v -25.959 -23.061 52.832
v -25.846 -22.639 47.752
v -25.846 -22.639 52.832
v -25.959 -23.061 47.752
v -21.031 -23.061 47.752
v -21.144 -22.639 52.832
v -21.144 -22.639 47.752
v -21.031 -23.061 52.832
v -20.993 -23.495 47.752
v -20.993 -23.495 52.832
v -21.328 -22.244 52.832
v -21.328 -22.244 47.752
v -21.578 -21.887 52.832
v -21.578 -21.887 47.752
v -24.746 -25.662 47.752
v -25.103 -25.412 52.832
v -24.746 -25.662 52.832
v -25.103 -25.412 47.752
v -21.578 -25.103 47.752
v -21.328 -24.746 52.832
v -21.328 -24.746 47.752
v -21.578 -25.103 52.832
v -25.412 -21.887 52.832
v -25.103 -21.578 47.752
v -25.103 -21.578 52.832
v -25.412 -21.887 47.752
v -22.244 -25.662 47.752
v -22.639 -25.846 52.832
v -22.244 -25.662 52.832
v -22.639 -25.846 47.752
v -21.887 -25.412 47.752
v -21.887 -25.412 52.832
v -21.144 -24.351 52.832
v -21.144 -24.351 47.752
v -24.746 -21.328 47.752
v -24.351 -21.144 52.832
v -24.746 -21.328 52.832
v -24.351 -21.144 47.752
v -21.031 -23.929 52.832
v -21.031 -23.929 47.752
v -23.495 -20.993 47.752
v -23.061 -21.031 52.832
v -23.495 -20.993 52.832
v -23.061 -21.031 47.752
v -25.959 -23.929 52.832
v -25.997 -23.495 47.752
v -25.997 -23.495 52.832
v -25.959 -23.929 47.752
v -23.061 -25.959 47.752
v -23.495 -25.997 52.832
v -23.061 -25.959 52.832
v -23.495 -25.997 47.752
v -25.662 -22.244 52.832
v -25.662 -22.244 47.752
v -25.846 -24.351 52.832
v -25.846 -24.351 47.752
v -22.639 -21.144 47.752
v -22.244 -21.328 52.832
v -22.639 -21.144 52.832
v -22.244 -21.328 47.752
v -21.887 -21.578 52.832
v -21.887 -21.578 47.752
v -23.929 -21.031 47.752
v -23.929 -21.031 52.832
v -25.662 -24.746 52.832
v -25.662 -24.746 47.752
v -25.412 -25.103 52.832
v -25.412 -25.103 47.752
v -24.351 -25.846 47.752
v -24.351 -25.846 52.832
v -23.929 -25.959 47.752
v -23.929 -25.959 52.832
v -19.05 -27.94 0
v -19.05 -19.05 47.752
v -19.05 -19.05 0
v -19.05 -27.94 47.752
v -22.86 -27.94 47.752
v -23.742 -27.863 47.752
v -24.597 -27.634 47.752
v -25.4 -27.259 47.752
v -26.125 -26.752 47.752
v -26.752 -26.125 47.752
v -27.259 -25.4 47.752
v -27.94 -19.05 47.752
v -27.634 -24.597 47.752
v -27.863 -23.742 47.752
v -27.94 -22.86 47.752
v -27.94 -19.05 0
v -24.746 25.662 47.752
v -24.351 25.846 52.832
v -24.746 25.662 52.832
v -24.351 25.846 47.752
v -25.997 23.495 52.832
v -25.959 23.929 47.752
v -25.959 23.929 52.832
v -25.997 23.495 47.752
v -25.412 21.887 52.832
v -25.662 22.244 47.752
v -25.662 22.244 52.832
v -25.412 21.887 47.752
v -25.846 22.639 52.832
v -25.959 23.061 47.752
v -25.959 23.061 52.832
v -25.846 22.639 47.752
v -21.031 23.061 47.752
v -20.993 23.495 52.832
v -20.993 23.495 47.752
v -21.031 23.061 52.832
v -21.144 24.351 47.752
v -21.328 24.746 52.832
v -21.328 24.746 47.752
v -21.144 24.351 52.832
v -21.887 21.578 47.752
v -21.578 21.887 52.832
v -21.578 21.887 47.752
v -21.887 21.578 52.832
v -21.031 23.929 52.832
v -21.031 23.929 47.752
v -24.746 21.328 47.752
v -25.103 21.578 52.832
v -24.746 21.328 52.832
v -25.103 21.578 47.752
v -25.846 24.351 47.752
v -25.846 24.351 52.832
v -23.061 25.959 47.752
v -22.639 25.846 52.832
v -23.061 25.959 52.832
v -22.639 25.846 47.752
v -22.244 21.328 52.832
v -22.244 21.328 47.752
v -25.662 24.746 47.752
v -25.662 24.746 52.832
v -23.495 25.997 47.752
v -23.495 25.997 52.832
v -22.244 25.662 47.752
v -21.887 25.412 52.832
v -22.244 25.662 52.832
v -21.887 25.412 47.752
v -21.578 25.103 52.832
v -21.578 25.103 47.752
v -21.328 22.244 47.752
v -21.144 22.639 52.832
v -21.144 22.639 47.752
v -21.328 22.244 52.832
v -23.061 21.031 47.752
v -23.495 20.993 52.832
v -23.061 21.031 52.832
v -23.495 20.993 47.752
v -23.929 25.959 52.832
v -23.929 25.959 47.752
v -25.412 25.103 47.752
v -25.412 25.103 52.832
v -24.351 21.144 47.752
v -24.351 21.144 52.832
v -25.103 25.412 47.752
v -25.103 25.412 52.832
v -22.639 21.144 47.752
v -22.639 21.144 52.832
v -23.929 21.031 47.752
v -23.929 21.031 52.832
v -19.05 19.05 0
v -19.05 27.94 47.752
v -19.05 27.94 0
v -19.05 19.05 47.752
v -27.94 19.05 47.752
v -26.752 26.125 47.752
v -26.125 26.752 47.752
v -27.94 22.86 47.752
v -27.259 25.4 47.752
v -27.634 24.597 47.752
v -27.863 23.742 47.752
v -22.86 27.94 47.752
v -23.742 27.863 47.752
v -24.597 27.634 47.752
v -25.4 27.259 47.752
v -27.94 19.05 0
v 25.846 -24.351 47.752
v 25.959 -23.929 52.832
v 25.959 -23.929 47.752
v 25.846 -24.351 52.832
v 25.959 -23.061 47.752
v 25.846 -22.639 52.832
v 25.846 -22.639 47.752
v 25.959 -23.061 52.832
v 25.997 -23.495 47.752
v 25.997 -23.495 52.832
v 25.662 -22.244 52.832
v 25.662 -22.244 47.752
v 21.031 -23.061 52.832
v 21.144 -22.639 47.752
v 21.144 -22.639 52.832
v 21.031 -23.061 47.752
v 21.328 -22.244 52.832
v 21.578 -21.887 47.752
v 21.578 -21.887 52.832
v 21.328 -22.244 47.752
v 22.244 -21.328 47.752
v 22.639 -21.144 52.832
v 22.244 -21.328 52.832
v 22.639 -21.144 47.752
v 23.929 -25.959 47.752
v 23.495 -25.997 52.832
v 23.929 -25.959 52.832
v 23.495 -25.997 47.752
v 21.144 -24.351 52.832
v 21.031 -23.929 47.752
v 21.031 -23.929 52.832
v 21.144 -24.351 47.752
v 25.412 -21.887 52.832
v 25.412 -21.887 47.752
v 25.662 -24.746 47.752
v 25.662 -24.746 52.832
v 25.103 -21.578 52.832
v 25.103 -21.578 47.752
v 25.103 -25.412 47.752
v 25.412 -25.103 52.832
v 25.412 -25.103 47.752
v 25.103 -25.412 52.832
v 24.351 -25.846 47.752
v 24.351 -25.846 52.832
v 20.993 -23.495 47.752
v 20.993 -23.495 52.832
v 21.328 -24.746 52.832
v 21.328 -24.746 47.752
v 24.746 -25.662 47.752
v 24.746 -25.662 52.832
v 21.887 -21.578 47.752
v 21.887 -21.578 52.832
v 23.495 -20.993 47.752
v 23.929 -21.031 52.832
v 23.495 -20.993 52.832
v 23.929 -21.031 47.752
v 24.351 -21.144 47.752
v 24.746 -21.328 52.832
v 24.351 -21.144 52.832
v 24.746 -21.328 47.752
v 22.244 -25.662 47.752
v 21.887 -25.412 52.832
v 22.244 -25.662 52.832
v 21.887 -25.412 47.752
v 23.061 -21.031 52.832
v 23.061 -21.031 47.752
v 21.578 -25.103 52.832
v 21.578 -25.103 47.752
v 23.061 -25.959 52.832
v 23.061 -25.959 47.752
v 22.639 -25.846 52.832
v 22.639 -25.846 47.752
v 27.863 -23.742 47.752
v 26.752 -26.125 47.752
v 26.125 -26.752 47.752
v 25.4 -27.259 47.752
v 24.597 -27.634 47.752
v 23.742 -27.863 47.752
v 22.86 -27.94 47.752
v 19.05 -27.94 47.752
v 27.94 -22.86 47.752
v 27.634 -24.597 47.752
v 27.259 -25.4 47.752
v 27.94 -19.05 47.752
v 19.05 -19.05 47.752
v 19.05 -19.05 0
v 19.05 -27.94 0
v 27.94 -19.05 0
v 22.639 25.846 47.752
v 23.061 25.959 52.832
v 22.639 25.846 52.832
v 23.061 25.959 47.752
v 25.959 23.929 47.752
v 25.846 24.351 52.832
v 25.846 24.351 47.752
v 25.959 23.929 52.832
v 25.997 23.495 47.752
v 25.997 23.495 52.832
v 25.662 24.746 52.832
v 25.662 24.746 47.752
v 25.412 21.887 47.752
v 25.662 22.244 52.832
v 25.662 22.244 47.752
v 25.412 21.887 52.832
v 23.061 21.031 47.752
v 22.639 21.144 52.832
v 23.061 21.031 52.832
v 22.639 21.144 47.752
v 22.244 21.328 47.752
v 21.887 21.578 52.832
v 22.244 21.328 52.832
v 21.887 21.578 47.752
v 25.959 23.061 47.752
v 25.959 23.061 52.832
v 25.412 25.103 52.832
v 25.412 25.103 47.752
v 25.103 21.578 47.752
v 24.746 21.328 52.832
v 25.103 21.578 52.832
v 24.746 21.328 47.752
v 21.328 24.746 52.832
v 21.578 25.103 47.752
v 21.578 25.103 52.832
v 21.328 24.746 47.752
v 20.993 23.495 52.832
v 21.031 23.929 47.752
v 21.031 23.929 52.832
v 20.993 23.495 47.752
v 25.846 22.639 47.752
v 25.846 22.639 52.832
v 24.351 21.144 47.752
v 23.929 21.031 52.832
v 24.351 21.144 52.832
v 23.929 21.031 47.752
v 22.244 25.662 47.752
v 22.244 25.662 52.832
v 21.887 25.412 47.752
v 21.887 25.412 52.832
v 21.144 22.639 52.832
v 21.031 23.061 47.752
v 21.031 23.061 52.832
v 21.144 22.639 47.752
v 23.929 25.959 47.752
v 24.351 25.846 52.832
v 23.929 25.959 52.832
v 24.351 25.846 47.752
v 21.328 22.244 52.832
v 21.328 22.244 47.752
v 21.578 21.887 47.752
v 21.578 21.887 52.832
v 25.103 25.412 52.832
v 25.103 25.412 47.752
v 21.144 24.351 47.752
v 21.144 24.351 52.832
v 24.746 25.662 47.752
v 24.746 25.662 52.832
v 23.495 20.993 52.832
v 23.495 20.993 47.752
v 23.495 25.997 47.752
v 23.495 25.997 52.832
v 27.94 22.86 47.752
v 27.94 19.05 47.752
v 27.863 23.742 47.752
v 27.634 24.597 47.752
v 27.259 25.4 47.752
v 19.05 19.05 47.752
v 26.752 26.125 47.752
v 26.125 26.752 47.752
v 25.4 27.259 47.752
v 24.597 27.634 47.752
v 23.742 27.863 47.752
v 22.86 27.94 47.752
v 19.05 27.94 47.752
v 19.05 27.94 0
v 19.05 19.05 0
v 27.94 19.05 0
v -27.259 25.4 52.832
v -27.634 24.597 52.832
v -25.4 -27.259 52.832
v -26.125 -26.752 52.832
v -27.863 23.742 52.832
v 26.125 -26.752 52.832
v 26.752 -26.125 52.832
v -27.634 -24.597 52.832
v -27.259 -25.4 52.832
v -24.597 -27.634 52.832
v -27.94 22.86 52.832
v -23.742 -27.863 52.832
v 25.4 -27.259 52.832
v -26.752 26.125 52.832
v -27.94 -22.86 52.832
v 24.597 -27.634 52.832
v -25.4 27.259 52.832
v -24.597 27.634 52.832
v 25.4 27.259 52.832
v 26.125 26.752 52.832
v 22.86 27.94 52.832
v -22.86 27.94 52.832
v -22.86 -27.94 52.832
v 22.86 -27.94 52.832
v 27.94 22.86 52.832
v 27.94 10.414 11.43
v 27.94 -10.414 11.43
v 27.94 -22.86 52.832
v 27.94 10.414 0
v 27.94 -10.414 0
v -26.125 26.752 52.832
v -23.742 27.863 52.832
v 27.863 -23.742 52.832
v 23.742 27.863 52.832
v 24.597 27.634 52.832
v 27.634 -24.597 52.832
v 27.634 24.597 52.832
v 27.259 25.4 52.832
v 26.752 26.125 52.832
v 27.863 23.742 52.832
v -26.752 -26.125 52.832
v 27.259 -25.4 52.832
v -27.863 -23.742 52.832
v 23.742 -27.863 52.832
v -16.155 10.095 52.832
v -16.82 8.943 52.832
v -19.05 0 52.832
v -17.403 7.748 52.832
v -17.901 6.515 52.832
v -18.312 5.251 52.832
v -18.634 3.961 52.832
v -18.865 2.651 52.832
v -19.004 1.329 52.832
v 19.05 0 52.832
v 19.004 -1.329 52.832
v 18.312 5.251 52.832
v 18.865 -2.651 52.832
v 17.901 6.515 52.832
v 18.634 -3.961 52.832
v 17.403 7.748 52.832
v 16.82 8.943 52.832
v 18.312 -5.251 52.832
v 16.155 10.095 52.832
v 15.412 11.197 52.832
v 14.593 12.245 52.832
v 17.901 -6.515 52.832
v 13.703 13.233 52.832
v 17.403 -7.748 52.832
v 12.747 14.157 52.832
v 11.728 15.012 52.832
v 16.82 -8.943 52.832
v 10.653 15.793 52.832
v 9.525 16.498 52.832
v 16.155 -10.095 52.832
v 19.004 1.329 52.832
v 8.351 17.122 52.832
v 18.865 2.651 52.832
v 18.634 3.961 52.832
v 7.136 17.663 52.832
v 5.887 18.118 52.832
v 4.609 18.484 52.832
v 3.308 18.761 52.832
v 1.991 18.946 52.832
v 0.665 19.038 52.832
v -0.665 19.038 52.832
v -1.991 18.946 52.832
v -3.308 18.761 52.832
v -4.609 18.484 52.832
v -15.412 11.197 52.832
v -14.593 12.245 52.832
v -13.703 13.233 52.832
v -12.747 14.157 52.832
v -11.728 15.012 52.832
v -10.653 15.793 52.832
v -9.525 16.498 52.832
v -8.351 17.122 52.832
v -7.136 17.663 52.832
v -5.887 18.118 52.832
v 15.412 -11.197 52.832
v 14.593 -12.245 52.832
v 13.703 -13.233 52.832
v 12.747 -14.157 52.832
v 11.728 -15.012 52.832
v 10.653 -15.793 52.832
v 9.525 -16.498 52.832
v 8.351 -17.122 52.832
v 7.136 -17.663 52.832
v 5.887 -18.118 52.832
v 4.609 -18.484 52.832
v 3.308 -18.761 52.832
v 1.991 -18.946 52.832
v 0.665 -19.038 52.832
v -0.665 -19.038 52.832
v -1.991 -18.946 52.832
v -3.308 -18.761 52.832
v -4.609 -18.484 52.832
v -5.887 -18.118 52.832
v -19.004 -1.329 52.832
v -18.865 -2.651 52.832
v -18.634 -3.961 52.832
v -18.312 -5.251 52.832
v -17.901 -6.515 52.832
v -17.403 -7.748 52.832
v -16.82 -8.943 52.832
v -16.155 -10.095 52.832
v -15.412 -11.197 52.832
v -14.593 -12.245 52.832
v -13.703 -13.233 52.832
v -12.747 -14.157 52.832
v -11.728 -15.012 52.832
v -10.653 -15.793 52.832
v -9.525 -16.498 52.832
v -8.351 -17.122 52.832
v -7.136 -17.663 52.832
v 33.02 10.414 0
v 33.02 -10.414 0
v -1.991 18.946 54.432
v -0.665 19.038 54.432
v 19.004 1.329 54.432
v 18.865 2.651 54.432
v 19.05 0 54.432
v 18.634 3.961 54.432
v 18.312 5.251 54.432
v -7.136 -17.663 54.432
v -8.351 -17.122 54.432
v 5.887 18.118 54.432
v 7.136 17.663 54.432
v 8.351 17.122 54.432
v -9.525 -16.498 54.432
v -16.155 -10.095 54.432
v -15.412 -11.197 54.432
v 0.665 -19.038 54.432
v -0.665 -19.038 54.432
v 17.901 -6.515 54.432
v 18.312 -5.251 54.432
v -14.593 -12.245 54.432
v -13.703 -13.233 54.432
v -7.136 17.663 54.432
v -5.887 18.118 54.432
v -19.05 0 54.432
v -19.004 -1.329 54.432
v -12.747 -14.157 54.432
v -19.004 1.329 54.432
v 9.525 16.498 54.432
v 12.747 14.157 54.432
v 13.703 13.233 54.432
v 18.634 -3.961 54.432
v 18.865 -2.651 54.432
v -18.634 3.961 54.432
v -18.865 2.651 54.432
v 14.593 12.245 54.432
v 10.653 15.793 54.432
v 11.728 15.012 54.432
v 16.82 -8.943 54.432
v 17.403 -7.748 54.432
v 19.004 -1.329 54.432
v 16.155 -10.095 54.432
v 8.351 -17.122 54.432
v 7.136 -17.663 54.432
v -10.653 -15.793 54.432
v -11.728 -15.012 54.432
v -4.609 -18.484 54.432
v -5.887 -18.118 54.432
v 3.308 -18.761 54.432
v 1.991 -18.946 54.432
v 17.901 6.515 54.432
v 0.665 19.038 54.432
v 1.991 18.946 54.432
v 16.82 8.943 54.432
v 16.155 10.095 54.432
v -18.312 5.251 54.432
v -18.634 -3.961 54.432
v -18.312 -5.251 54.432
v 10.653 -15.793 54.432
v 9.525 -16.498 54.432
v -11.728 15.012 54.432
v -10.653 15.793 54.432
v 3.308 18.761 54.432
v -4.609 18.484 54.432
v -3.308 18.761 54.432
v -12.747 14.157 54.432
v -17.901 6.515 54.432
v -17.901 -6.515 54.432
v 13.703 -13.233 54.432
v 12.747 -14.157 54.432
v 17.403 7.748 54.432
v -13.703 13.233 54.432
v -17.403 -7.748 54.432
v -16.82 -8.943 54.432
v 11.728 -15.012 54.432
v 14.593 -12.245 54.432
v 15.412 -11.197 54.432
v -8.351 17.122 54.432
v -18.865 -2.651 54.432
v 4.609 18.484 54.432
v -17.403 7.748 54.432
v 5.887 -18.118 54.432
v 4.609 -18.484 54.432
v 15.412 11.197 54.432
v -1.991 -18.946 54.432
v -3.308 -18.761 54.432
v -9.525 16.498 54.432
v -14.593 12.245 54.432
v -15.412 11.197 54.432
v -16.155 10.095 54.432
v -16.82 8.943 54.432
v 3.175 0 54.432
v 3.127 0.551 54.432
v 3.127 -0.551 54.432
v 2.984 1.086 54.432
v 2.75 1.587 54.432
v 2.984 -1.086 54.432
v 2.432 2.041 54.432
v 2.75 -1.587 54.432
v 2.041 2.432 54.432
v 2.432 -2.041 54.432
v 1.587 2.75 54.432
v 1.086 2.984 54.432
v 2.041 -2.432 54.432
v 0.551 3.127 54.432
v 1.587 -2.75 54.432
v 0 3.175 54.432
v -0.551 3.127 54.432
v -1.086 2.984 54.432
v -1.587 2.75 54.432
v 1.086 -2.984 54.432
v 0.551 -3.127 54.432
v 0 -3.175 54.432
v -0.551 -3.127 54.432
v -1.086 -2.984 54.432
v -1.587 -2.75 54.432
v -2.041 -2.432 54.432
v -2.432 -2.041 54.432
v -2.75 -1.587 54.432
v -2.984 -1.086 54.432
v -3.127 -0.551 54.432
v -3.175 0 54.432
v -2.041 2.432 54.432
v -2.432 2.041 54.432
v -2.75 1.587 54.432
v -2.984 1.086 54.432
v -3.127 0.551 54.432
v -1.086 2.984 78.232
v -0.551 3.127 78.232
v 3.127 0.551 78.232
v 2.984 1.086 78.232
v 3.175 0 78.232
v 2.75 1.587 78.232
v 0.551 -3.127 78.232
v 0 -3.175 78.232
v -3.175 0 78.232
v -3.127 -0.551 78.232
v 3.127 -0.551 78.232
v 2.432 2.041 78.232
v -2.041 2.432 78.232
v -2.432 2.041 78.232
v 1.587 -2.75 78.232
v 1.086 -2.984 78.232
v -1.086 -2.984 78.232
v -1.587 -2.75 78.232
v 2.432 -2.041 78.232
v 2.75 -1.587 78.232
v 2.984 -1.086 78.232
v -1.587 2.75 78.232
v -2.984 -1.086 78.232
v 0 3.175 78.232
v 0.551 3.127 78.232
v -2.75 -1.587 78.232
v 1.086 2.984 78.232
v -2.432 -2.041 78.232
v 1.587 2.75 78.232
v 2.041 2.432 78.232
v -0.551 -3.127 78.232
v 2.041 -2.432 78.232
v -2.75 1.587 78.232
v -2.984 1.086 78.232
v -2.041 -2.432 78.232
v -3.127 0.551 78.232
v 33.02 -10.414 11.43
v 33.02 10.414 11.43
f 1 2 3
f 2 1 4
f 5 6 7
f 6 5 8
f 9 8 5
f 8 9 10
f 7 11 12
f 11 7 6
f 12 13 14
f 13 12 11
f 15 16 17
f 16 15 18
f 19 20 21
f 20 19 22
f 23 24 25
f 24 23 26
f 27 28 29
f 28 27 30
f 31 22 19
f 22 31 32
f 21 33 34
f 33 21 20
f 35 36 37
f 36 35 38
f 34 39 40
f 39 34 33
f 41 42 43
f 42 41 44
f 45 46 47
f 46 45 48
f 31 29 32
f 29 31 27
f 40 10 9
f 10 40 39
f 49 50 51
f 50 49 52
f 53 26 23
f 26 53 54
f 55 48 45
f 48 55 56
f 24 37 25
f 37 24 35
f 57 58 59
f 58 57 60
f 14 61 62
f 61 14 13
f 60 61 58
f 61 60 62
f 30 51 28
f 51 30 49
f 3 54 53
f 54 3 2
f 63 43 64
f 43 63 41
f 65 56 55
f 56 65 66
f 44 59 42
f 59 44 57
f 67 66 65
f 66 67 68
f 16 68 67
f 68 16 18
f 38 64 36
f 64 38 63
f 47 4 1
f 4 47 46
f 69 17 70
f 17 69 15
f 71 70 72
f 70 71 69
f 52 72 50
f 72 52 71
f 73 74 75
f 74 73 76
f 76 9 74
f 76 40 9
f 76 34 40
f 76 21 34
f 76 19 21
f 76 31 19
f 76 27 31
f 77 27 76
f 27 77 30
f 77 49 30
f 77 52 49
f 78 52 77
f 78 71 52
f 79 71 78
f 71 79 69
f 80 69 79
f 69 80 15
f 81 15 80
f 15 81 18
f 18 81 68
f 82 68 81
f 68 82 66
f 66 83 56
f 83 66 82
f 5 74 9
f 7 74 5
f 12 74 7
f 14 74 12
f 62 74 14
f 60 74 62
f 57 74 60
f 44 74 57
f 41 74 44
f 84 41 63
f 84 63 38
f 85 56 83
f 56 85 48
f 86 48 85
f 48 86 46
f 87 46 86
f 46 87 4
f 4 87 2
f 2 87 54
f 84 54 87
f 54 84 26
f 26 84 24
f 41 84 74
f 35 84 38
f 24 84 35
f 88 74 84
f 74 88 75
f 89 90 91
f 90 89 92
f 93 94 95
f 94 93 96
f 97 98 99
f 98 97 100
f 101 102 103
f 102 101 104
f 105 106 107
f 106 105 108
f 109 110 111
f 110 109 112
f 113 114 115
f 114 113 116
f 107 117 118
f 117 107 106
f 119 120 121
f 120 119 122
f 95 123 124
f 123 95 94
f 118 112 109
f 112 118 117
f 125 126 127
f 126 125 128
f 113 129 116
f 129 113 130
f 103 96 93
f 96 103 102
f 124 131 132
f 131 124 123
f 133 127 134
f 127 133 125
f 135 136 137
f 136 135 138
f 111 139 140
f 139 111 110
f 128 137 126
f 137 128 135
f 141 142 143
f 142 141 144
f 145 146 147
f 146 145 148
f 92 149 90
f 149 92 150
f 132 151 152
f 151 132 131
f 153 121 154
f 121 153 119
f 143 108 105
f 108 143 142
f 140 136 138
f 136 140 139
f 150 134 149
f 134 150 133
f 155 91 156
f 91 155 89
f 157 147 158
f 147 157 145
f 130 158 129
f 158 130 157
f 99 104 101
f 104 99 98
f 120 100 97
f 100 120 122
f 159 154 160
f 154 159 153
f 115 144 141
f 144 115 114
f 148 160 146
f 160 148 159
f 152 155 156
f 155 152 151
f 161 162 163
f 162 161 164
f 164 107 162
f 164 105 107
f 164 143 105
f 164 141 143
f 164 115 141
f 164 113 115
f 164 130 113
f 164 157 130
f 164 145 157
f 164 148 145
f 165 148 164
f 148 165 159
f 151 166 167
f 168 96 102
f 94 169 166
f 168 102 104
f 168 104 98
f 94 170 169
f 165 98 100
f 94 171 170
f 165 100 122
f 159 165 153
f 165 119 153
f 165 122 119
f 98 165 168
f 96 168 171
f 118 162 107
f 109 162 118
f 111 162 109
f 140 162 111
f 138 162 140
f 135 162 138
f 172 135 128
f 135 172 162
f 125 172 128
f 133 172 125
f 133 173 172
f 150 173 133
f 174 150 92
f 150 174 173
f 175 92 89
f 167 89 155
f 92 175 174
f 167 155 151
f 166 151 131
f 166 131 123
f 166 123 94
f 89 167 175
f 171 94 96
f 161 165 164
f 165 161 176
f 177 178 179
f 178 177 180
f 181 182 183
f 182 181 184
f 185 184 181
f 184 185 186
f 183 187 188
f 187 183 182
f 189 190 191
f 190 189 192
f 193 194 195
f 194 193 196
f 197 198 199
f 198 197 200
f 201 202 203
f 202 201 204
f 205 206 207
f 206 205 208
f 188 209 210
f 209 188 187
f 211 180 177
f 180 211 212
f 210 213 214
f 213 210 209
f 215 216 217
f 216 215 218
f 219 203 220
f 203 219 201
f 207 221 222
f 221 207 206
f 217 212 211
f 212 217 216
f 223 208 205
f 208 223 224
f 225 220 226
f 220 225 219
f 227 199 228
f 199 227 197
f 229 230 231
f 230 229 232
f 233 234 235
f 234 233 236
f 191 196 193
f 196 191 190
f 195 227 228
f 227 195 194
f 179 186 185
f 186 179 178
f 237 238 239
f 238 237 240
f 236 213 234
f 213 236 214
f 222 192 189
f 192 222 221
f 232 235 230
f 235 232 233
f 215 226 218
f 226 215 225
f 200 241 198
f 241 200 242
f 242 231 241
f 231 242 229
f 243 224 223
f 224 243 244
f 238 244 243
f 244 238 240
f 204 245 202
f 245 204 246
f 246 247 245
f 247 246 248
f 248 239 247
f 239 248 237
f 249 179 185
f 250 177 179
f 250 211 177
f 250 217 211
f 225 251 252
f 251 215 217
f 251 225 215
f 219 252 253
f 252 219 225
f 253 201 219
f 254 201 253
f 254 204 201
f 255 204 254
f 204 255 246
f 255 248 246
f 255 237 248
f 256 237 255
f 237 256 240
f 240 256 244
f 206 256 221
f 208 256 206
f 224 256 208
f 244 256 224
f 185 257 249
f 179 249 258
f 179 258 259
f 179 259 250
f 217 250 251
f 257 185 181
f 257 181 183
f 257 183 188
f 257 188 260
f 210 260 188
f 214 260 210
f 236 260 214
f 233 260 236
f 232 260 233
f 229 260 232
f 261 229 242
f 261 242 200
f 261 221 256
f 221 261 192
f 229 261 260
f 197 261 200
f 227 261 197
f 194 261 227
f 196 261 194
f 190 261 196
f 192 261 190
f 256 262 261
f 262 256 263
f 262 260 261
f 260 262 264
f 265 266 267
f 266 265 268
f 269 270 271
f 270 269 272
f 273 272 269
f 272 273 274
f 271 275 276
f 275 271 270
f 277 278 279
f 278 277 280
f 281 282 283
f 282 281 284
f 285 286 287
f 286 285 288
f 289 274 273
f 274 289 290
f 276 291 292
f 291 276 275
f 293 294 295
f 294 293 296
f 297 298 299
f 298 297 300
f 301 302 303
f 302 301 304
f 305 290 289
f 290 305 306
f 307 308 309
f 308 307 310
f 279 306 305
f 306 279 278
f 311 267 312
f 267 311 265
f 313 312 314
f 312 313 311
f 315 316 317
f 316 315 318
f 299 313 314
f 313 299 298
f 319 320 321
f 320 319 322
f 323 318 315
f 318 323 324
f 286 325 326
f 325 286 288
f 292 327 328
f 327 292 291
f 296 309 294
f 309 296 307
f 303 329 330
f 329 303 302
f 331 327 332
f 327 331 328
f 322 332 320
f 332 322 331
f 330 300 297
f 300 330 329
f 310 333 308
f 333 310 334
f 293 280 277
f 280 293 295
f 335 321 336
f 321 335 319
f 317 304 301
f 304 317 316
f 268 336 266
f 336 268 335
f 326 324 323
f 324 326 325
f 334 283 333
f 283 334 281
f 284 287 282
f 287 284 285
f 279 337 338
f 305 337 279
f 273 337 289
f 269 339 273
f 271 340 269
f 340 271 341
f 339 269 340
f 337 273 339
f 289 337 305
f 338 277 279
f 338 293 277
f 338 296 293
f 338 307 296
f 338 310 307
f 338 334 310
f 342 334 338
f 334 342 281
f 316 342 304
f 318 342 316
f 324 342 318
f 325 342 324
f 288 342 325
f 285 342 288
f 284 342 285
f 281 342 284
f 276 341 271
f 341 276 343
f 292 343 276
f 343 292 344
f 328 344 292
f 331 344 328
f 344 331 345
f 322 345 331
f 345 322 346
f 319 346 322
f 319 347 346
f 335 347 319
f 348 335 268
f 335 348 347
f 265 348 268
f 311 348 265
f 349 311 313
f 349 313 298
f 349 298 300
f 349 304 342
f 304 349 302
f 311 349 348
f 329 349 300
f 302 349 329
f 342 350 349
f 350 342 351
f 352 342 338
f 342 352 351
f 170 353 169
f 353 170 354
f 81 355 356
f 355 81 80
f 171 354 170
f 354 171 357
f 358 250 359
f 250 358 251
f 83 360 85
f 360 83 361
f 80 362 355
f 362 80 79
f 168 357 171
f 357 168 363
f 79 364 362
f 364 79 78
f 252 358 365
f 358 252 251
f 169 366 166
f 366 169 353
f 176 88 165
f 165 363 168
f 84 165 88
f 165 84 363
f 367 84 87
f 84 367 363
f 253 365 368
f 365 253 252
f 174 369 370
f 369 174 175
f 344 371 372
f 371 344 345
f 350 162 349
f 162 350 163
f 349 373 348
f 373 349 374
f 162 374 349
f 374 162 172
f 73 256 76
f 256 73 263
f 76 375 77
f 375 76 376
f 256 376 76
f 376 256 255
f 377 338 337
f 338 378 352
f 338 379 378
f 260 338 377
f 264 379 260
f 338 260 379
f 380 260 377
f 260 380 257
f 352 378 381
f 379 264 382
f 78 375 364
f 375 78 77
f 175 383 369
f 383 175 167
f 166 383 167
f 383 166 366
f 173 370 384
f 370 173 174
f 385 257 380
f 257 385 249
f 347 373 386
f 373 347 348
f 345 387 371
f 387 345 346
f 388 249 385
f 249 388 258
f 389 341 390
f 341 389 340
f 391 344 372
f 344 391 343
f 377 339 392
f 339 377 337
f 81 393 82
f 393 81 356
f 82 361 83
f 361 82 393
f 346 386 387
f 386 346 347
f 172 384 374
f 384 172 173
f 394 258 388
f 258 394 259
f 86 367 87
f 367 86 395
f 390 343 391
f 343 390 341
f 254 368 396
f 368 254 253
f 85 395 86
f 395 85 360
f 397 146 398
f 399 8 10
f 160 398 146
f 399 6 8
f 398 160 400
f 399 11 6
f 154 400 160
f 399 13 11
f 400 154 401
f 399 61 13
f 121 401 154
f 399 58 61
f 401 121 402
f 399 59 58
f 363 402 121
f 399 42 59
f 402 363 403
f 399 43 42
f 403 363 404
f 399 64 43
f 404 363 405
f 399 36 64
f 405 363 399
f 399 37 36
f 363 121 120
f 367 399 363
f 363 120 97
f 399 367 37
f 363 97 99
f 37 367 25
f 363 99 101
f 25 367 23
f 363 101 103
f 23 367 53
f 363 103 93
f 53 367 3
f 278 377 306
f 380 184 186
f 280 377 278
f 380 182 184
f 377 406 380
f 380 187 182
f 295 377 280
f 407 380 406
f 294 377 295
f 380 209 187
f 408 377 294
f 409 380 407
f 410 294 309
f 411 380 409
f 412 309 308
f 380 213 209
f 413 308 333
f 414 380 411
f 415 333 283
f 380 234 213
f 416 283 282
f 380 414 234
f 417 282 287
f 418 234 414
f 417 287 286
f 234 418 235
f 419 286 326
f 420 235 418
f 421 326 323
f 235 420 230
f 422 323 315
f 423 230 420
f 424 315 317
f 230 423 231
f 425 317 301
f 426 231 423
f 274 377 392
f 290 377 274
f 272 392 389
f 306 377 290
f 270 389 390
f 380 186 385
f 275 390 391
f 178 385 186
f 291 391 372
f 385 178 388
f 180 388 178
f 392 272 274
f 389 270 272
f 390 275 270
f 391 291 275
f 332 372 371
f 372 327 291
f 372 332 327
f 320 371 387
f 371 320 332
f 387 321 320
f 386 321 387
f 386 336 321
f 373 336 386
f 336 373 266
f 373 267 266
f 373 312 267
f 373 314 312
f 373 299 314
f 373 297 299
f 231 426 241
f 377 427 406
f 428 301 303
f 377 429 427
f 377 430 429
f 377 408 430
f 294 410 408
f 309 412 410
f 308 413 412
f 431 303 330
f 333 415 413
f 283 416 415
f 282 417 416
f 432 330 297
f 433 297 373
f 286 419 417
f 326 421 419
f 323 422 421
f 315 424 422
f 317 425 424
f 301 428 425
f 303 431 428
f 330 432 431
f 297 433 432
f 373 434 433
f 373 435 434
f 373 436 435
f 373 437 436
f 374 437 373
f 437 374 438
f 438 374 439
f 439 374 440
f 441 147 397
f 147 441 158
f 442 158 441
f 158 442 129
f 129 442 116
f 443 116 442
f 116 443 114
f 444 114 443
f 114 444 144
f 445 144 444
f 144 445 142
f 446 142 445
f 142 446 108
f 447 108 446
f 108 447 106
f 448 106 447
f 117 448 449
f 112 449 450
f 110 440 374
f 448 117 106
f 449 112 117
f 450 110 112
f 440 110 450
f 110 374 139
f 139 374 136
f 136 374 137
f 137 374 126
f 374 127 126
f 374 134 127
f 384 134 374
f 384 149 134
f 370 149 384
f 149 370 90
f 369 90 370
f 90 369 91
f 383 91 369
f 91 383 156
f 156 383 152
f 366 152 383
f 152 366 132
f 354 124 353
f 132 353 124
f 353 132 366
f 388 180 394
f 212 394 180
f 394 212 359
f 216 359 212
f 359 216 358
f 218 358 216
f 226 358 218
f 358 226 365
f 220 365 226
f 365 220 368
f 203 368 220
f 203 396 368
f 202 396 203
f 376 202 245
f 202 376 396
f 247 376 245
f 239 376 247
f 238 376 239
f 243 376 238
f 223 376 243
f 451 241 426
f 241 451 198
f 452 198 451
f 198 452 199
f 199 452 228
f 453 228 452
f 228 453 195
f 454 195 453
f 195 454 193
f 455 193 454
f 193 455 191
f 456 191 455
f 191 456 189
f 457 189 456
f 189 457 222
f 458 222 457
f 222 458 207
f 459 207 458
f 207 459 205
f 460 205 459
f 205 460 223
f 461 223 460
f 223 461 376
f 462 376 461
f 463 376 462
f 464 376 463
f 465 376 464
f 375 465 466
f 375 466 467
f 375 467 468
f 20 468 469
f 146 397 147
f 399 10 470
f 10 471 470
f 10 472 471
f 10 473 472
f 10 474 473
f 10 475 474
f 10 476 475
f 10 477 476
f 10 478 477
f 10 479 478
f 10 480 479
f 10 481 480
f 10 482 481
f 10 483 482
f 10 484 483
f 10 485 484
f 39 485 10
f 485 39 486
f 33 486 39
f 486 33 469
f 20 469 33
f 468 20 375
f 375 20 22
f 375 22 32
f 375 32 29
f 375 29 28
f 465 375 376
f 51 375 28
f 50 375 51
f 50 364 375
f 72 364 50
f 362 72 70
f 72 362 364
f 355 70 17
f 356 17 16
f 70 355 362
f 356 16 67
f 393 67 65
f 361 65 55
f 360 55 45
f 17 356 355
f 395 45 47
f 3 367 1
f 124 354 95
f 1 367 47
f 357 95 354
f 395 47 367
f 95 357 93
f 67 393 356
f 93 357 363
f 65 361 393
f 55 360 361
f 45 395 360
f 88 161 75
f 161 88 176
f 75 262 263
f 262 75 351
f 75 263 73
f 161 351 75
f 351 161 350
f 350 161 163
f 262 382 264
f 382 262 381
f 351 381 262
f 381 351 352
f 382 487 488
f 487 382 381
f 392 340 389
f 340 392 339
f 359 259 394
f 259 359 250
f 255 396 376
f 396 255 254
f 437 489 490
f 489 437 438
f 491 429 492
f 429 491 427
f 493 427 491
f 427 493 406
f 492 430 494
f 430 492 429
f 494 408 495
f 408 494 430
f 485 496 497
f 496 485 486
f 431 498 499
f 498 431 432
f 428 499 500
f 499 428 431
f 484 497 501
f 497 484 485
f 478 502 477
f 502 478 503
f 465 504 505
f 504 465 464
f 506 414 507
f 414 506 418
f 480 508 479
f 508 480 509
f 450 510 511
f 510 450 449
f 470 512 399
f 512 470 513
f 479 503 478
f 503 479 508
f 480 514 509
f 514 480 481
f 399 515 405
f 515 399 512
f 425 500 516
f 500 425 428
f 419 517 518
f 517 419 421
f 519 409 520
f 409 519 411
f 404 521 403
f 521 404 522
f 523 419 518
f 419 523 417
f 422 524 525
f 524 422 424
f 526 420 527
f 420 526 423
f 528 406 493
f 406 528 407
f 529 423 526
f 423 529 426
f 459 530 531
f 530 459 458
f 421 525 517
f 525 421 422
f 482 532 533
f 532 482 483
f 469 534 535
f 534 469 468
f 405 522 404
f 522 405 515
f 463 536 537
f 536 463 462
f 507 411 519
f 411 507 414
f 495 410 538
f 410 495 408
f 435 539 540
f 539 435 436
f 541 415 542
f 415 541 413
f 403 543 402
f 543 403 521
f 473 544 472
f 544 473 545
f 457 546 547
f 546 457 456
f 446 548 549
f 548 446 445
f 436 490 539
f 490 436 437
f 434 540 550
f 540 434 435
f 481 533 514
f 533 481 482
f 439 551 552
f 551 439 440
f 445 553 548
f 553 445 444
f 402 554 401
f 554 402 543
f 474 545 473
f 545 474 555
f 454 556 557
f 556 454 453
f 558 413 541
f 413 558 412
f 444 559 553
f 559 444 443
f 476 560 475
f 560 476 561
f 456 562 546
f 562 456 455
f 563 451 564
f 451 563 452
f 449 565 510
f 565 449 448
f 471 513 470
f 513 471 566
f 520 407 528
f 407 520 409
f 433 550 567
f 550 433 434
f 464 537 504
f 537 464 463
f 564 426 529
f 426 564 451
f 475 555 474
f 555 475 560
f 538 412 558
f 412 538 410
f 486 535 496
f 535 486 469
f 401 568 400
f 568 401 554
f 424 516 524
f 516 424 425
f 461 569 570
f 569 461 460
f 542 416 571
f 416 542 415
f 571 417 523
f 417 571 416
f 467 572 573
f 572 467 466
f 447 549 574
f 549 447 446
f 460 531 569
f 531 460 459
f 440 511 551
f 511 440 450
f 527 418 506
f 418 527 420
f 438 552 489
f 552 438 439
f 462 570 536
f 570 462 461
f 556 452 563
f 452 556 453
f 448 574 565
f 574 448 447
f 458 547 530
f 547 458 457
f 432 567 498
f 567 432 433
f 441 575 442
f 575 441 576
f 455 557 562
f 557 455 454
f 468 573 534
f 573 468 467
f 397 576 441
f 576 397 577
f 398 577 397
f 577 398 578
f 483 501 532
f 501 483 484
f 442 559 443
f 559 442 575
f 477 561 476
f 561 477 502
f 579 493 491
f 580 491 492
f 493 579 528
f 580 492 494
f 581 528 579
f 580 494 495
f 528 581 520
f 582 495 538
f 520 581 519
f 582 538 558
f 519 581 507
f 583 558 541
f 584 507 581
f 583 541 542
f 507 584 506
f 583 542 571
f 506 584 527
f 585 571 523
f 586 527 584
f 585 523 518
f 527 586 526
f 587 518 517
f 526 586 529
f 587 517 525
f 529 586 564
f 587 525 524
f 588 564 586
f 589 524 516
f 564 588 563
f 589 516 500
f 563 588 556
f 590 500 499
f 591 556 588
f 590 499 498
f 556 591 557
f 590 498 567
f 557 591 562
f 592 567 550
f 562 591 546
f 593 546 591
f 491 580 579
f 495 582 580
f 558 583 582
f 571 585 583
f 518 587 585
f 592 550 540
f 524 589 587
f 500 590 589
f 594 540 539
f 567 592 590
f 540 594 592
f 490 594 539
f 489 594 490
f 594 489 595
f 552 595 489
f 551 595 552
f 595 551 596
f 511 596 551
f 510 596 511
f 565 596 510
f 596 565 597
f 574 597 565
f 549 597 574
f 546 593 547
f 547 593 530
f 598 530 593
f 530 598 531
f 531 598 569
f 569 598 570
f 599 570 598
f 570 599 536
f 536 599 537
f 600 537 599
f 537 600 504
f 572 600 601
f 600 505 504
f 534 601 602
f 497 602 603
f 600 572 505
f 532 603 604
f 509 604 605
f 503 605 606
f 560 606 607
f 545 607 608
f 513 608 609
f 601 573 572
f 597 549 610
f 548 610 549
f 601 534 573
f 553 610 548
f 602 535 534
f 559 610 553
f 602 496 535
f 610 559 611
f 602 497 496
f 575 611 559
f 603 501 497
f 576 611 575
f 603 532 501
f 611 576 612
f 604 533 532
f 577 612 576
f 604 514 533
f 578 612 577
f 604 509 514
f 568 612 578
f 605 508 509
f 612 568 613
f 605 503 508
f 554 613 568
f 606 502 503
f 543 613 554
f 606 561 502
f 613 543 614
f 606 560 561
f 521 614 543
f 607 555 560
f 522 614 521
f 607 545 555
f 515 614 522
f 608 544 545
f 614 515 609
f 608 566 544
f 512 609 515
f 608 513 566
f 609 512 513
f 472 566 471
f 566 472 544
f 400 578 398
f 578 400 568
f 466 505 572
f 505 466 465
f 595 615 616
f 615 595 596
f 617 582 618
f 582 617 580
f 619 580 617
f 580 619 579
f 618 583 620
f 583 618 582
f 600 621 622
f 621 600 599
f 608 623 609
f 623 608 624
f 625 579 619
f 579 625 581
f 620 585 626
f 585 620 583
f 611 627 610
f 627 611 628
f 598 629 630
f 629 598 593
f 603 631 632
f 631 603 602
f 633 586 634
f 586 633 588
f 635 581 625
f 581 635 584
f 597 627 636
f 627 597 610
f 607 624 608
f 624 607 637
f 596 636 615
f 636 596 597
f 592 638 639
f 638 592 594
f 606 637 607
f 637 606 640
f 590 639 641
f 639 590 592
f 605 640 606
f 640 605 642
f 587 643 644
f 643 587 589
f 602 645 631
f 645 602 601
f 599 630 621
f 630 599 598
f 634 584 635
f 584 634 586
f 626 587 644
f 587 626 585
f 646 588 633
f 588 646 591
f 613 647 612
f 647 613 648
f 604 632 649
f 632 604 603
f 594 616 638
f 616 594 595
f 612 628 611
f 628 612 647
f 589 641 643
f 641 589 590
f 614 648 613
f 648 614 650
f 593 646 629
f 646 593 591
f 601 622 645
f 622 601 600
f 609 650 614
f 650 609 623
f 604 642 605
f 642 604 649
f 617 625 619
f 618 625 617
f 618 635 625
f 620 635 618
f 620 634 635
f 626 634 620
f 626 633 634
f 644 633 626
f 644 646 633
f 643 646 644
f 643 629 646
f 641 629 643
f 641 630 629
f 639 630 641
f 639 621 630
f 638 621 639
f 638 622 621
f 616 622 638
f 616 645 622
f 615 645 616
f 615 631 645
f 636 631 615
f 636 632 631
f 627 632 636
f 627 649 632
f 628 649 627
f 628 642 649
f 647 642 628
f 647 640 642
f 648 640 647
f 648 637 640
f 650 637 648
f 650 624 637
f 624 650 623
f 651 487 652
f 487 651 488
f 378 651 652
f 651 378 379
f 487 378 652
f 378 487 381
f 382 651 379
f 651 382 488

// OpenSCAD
// Dimensions are given in inches, and multiplied by 25.4 to convert mm
module Nema23(length=2.08)
{
	inch = 25.4; // inch to mm
	translate([0,0,length]*inch){
		difference(){
			hull() for(x=[-1,1],y=[-1,1])
				translate([x*1.8,y*1.8,-length]*.5*inch)
				cylinder(d=.4*inch,h=length*inch,center=true,$fn=36); // Main Motor Body
			for(x=[-1,1],y=[-1,1]){
				translate([x*1.85,y*1.85,-length+1]*.5*inch)
					cylinder(d=.197*inch,h=length*inch,center=true,$fn=36); // Screw Holes
				translate([x*1.87,y*1.87,-length-.2*2]*.5*inch)
					cube([.37,.37,length]*inch,center=true); // Motor Body inset parts
			}
		}
		cylinder(d=1.5*inch,h=.063*inch,$fn=90); // Motor Circle Thing
		cylinder(d=.25*inch,h=1*inch,$fn=36); // Rod
		translate([1.10,-.41,-length]*inch) cube([.2,.82,.45]*inch); // Cable Connector
	}
}

Nema23();
